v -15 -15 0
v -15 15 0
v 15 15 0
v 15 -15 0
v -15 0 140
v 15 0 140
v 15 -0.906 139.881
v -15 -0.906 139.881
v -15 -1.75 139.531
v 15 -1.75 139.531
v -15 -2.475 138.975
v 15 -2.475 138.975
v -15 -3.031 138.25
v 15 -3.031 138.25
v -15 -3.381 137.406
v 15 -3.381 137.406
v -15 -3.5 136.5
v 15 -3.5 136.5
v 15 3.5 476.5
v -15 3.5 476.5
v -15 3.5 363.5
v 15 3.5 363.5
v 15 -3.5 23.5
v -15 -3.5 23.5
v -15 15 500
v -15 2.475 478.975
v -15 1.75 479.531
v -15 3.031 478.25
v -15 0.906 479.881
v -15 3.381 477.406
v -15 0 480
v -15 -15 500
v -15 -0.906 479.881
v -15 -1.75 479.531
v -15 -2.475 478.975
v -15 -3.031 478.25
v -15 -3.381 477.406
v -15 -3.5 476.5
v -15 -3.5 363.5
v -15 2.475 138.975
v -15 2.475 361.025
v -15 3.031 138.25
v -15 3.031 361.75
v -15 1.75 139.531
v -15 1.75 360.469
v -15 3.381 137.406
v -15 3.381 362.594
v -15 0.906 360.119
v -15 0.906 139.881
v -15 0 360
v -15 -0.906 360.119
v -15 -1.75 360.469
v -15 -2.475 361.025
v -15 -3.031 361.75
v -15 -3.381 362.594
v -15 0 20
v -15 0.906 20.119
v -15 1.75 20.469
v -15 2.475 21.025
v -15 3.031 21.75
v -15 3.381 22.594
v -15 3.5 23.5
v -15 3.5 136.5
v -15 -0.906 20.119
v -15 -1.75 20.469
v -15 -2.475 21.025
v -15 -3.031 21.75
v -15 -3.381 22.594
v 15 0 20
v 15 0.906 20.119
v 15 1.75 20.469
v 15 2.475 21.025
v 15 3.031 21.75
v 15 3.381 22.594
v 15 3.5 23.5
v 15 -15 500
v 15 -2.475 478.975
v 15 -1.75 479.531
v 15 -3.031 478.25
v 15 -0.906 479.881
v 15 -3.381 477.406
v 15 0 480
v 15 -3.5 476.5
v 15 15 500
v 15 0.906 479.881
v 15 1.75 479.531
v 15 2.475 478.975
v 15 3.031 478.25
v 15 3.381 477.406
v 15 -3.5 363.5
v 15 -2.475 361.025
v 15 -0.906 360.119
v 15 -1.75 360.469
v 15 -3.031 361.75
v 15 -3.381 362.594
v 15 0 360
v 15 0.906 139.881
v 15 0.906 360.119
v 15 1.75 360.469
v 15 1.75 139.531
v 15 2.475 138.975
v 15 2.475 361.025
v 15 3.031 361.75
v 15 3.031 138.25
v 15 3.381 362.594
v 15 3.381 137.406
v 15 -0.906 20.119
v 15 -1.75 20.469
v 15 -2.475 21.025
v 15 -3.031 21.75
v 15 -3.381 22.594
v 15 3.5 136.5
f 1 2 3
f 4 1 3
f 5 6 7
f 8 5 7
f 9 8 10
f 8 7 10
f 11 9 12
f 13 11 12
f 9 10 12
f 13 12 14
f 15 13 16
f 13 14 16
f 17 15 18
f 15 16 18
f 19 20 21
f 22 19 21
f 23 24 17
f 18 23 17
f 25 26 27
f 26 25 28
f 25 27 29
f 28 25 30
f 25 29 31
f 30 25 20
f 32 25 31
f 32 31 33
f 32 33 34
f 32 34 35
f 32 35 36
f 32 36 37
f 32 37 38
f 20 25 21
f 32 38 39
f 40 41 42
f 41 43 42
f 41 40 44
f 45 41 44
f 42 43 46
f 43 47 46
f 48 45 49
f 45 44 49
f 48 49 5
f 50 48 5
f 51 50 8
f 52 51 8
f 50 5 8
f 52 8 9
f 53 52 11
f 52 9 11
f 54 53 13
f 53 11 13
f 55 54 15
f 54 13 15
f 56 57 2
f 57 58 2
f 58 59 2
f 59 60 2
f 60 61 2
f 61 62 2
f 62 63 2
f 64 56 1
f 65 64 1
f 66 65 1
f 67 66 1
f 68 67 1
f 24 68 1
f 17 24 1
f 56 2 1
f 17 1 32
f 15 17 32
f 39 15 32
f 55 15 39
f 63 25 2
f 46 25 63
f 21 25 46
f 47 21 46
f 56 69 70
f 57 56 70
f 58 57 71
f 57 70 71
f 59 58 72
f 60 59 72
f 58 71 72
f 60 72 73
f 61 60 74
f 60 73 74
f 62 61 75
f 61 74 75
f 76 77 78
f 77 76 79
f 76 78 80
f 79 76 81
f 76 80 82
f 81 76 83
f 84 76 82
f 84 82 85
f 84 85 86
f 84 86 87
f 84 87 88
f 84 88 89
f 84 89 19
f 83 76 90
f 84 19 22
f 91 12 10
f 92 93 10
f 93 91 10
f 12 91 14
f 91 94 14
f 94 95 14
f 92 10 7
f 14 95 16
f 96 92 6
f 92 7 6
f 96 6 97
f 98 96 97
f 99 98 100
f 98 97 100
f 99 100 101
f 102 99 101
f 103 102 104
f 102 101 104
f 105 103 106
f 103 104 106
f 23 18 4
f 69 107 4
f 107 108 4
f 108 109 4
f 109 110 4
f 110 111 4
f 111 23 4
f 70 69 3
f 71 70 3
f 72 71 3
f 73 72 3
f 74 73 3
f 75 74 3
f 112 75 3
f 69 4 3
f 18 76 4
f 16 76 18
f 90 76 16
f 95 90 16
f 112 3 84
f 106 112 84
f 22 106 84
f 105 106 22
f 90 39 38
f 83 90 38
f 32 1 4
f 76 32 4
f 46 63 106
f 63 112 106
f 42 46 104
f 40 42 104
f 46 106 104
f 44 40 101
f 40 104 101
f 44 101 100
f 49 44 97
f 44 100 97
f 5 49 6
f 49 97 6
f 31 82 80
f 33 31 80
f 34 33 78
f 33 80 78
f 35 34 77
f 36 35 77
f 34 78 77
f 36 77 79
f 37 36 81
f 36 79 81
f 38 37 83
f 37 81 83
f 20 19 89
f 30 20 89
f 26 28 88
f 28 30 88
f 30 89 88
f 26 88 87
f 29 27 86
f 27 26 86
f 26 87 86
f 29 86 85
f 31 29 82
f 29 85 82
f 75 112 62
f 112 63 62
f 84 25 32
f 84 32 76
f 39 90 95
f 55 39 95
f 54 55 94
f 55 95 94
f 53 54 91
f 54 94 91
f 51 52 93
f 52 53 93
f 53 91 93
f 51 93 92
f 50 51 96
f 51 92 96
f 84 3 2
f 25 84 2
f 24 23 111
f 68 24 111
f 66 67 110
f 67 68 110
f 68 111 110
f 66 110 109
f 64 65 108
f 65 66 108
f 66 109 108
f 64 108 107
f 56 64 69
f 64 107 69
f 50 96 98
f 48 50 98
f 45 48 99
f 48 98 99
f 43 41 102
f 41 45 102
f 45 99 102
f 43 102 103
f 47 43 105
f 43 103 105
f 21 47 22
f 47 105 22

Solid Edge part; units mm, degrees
sketch "Sketch1" plane through (0, 0, 0) normal (0, 0, 1) x (1, 0, 0)
  line L0 (-15, -15) -> (15, -15)
  line L1 (15, -15) -> (15, 15)
  line L2 (15, 15) -> (-15, 15)
  line L3 (-15, 15) -> (-15, -15)
extrude "Protrusion1" add sketch "Sketch1" along normal blind 500
sketch "Sketch2" plane through (-15, 0, 250) normal (-1, 0, 0) x (0, 0, -1)
  line L0 (230, 3.5) -> (110, 3.5)
  line L1 (110, 3.5) -> (110, -3.5)
  line L2 (110, -3.5) -> (230, -3.5)
  line L3 (230, -3.5) -> (230, 3.5)
extrude "Extrusionsausschnitt_5" cut sketch "Sketch2" against normal blind 310
fillet "Verrundung_1" radius 3.5 4 edges at (0, 3.5, 140) (0, -3.5, 140) (0, 3.5, 20) (0, -3.5, 20)
mirror "Mirror1" about plane through (0, 0, 250) normal (0, 0, -1) of "Extrusionsausschnitt_5", "Verrundung_1"
